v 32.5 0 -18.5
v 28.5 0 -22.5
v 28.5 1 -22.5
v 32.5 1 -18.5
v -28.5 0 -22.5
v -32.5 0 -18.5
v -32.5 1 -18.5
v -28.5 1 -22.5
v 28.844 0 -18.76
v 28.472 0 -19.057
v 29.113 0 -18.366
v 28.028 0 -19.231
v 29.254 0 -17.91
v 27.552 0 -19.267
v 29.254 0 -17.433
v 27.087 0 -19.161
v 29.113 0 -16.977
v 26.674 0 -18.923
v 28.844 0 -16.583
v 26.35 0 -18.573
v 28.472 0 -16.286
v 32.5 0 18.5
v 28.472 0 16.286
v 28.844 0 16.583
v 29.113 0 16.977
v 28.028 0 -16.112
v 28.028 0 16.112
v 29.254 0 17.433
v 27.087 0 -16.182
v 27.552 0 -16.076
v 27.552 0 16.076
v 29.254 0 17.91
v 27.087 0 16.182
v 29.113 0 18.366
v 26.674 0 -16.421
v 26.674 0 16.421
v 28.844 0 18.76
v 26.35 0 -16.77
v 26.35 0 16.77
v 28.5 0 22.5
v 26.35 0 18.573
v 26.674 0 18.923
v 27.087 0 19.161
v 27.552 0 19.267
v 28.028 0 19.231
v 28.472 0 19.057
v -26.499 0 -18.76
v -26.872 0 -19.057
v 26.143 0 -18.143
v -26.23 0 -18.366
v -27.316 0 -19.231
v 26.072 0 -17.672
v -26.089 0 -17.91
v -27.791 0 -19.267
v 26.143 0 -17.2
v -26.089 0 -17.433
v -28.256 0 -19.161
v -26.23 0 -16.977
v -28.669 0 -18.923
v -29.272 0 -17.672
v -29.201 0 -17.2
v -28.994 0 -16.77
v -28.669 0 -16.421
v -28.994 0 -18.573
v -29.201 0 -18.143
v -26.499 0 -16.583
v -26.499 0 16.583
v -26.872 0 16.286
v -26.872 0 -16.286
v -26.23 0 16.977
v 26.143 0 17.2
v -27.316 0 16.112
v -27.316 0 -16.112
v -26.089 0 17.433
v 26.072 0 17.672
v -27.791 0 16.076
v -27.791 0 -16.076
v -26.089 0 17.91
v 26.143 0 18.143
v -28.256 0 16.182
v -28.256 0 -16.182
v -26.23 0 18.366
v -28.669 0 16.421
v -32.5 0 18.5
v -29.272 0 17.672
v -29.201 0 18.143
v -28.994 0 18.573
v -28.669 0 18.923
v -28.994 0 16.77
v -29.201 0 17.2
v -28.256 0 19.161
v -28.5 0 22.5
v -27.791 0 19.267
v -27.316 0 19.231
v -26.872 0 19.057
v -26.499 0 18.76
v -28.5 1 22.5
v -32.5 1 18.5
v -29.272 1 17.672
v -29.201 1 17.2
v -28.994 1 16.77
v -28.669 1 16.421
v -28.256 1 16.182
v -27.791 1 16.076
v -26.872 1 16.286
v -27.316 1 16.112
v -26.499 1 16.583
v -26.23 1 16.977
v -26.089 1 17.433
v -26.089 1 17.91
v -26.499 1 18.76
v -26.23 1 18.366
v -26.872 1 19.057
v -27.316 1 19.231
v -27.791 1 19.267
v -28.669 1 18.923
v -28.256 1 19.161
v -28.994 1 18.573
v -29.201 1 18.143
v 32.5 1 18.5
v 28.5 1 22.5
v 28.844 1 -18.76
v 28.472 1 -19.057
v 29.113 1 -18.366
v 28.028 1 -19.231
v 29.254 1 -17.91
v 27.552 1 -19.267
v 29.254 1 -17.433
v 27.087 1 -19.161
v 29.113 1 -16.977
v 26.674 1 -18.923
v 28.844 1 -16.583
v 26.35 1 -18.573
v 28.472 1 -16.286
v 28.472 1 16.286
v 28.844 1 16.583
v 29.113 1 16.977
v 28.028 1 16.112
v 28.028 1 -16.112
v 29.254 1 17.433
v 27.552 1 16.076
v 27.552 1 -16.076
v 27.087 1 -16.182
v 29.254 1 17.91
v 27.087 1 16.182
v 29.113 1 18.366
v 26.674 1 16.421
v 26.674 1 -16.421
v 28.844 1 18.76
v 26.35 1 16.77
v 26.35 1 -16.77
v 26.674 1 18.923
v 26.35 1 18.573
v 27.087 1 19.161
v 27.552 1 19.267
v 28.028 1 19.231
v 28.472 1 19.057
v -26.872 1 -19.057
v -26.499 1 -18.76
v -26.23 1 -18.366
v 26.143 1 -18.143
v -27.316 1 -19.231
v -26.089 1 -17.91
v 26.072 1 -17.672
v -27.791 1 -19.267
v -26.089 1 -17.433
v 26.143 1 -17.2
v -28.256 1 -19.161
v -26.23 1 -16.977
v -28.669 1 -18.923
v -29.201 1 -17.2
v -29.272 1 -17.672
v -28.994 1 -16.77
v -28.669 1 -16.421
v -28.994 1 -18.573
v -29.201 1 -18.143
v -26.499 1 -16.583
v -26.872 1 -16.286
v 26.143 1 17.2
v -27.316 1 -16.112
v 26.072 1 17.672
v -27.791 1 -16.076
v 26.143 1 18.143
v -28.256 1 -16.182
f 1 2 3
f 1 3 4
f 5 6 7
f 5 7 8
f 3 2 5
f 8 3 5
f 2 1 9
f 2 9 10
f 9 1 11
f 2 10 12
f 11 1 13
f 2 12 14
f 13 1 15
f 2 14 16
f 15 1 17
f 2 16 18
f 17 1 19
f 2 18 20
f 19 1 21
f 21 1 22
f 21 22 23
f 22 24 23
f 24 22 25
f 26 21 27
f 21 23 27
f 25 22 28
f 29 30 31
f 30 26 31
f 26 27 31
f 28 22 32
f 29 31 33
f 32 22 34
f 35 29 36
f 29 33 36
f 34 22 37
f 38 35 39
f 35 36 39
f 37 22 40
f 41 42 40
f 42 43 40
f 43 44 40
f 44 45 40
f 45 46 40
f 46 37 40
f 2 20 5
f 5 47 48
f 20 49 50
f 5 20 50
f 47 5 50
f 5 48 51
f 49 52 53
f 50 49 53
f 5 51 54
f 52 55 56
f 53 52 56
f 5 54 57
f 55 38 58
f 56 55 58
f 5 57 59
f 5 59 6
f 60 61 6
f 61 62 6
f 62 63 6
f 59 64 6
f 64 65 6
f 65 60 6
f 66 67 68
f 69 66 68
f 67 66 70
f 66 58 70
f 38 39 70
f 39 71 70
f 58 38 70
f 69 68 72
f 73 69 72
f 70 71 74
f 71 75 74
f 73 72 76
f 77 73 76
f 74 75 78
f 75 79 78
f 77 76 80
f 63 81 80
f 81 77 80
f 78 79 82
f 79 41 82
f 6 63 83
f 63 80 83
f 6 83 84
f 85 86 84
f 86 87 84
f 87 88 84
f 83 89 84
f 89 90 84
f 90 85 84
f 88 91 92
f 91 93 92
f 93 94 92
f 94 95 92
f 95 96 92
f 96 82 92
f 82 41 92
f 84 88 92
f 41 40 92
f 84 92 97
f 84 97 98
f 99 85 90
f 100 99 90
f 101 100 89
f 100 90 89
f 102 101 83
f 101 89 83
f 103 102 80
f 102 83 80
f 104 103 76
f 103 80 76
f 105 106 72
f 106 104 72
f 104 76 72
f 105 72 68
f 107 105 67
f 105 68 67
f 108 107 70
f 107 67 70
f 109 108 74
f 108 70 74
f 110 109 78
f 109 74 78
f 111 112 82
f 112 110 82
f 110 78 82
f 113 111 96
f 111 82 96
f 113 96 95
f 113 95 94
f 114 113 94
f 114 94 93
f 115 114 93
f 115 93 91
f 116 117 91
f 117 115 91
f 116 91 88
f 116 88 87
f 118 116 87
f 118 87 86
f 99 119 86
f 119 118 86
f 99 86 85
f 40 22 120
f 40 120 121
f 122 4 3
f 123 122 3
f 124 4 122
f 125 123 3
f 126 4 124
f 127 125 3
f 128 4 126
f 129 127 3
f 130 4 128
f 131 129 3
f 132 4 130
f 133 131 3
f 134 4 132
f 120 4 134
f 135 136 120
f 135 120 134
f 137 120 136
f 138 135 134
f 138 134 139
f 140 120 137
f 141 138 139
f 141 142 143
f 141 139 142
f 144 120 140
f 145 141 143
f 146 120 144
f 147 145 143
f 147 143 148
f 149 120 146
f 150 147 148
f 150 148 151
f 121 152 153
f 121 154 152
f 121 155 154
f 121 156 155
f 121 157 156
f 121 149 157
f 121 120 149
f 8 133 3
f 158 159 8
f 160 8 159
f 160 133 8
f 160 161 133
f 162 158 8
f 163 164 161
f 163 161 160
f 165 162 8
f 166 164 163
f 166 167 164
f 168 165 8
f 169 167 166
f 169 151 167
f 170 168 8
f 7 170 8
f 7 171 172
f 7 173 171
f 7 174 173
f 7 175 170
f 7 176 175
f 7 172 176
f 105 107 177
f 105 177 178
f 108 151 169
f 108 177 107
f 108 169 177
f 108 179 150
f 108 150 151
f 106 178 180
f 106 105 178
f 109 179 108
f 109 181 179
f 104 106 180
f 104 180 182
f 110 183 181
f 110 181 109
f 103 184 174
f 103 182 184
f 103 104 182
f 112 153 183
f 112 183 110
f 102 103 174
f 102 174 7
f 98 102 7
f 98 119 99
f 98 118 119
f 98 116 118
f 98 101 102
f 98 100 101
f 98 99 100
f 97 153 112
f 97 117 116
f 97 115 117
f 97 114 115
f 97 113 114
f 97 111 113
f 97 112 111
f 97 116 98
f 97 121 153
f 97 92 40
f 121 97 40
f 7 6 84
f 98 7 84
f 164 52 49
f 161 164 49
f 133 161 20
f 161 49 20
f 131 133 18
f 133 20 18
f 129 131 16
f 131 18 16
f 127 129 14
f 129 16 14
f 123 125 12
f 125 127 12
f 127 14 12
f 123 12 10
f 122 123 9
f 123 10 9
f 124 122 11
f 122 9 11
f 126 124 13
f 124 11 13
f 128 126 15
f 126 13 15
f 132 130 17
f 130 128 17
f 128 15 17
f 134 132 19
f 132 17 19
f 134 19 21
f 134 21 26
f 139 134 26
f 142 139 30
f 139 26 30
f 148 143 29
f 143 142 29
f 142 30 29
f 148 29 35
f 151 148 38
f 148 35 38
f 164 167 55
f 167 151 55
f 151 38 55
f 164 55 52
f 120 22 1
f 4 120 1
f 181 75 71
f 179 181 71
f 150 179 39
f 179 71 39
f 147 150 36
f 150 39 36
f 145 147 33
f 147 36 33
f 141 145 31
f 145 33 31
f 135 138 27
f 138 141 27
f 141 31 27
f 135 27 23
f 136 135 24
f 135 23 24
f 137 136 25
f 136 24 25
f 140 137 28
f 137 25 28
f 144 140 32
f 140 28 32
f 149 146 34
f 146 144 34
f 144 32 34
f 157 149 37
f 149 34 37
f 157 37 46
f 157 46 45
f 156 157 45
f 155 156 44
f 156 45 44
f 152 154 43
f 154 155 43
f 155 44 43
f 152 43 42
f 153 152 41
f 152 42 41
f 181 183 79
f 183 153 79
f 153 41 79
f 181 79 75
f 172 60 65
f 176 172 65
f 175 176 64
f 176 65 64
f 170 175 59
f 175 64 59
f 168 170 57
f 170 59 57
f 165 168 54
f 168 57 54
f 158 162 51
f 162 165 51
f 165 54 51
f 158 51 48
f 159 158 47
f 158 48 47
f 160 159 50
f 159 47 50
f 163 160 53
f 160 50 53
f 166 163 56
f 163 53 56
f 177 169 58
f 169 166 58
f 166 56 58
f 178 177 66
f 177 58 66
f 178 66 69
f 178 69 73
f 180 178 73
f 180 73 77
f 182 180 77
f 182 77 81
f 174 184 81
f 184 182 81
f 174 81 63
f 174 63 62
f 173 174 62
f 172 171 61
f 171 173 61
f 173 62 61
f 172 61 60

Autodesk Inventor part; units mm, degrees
ref_plane "YZ Plane" through (0, 0, 0) normal (1, 0, 0) x (0, 1, 0)
ref_plane "XZ Plane" through (0, 0, 0) normal (0, 1, 0) x (-1, 0, 0)
ref_plane "XY Plane" through (0, 0, 0) normal (0, 0, 1) x (1, 0, 0)
sketch "Sketch1" plane through (0, 0, 0) normal (0, 1, 0) x (-1, 0, 0)
  line L0 (28.5, 22.5) -> (-28.5, 22.5)
  line L1 (-32.5, 18.5) -> (-32.5, -18.5)
  line L2 (-28.5, -22.5) -> (28.5, -22.5)
  line L3 (32.5, -18.5) -> (32.5, 18.5)
  line L4 (32.5, -18.5) -> (28.5, -22.5)
  line L5 (-28.5, -22.5) -> (-32.5, -18.5)
  line L6 (-32.5, 18.5) -> (-28.5, 22.5)
  line L7 (28.5, 22.5) -> (32.5, 18.5)
  line L8 (30.5, -20.5) -> (27.6716, -17.6716) construction
  line L9 (-30.5, -20.5) -> (-27.6716, -17.6716) construction
  line L10 (30.5, 20.5) -> (27.6716, 17.6716) construction
  line L11 (-30.5, 20.5) -> (-27.6716, 17.6716) construction
  circle A0 centre (27.6716, -17.6716) radius 1.6
  circle A1 centre (-27.6716, -17.6716) radius 1.6
  circle A2 centre (-27.6716, 17.6716) radius 1.6
  circle A3 centre (27.6716, 17.6716) radius 1.6
  point P0 (0, 0)
  point P1 (32.5, 22.5)
  point P2 (-32.5, 22.5)
  point P3 (-32.5, -22.5)
  point P4 (32.5, -22.5)
  dimension "d0" = 65
  dimension "d1" = 45
  dimension "d2" = 4
  dimension "d3" = 4
  dimension "d4" = 4
  dimension "d5" = 4
  dimension "d6" = 4
  dimension "d7" = 4
  dimension "d8" = 4
  dimension "d9" = 4
  dimension "d10" = 4
  dimension "d11" = 4
  dimension "d12" = 4
  dimension "d13" = 4
  dimension "d14" = 3.2
  dimension "d15" = 3.2
  dimension "d16" = 3.2
  dimension "d17" = 3.2
extrude "Extrusion1" add sketch "Sketch1" along normal blind 1
sketch "Sketch2" plane through (0, 1, 0) normal (0, 1, 0) x (1, 0, 0)
  circle A0 centre (-27.6716, -17.6716) radius 2.8
  circle A1 centre (-27.6716, 17.6716) radius 2.8
  circle A2 centre (27.6716, 17.6716) radius 2.8
  circle A3 centre (27.6716, -17.6716) radius 2.8
  point P0 (0, 0)
  dimension "d20" = 5.6
  dimension "d21" = 5.6
  dimension "d22" = 5.6
  dimension "d23" = 5.6
equation "\"d3\" = d2"
equation "\"d4\" = d2"
equation "\"d5\" = d4"
equation "\"d6\" = d2"
equation "\"d7\" = d6"
equation "\"d8\" = d2"
equation "\"d9\" = d8"
properties part number "ShootPCB"
